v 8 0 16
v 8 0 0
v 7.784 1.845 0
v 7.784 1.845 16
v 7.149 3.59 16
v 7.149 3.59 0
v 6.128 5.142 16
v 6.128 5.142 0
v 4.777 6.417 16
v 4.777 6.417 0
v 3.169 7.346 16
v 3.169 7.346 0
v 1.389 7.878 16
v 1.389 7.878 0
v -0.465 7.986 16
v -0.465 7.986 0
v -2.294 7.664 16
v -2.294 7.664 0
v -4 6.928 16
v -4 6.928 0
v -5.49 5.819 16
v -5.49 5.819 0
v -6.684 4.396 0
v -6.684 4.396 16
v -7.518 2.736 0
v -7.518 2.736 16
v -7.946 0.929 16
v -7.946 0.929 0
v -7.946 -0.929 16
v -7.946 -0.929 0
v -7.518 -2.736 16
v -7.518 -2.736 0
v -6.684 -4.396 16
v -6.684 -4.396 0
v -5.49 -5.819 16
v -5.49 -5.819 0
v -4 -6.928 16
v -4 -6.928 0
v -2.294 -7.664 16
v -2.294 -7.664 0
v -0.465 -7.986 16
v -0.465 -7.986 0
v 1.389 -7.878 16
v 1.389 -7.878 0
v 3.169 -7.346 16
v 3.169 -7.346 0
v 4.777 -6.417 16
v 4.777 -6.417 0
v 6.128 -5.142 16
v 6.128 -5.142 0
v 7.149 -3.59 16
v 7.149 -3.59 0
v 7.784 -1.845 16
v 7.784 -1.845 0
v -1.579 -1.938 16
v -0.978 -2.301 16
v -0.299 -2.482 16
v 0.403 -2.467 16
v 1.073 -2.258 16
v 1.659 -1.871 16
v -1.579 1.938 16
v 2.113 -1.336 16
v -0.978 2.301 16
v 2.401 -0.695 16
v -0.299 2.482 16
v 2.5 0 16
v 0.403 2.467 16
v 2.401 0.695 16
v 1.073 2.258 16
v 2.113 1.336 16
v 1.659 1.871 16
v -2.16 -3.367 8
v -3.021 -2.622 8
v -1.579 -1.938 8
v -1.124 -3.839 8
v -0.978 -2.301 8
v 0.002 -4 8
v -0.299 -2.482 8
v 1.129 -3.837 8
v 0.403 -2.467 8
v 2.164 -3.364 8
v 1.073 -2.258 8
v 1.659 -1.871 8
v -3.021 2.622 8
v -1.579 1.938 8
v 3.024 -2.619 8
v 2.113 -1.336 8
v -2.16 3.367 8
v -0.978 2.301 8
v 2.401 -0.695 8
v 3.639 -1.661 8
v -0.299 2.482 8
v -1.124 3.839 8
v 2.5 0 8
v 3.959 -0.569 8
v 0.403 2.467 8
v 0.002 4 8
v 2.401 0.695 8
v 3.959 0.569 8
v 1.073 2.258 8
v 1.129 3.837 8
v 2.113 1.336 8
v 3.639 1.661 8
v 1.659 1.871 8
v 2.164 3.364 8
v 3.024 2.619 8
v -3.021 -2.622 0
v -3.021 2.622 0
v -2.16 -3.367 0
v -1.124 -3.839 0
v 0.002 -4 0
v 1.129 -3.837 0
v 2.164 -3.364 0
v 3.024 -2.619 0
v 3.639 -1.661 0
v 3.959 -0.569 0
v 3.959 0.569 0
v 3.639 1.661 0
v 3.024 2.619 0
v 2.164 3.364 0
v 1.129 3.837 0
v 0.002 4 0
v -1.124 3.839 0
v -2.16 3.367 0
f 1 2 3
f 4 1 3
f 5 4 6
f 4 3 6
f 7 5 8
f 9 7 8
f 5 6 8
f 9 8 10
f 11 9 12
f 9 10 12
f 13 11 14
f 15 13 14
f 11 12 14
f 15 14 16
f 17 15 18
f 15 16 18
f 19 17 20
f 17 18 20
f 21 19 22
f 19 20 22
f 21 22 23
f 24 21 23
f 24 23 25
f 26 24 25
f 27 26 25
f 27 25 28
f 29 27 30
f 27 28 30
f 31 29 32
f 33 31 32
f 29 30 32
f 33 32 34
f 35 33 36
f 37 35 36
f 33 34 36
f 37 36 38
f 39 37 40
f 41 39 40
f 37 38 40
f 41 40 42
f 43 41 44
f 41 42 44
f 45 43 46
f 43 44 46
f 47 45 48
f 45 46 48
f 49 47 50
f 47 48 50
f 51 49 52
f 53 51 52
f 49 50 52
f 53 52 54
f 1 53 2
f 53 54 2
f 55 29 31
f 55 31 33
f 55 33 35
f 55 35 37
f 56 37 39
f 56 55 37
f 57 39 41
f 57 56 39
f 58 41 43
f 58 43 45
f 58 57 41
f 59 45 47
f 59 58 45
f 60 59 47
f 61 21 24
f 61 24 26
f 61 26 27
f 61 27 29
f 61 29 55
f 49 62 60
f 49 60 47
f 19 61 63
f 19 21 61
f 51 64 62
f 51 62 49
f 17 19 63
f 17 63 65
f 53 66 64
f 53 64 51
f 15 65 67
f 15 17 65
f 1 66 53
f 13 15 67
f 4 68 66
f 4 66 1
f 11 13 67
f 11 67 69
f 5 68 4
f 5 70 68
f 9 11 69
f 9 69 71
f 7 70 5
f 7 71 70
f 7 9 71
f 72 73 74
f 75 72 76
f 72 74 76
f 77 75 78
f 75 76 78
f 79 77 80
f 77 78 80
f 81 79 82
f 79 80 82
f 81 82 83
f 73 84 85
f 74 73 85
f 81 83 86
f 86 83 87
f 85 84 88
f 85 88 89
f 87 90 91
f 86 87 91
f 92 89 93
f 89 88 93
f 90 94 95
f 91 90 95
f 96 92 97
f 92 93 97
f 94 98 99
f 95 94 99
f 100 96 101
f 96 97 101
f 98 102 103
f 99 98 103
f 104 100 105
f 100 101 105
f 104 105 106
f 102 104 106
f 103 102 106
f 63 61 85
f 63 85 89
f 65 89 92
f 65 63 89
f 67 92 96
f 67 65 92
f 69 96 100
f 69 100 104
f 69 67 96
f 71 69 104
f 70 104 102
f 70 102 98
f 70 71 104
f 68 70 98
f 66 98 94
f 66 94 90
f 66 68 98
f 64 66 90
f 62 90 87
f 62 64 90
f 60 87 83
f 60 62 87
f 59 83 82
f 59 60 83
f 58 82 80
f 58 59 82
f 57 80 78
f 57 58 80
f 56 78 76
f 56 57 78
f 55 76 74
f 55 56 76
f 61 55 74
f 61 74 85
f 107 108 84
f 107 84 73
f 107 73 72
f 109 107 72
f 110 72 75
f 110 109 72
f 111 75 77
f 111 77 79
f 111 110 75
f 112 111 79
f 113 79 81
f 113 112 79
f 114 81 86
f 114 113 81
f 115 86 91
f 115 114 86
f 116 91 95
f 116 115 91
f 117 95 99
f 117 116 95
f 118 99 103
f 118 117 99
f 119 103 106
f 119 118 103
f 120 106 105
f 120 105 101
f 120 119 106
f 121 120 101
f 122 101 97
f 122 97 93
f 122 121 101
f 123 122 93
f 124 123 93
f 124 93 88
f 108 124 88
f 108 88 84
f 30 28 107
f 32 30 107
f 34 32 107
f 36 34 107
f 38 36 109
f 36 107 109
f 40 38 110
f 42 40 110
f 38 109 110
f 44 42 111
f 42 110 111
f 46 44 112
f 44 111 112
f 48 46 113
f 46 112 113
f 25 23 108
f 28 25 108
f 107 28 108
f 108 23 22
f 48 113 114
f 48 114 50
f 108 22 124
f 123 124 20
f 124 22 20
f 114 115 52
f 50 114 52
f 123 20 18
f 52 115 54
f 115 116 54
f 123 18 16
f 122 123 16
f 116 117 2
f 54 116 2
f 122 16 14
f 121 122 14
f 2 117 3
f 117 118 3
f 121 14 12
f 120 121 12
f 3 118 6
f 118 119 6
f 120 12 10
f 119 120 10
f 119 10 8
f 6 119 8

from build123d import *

# Parameters (mm, degrees)
SKETCH_1_R          = 8
EXTRUDE_1_DEPTH     = 16
CUT_EXTRUDE_1_DEPTH = 8
CUT_EXTRUDE_2_DEPTH = 8


with BuildPart() as part:
    # 草图1 → 凸台-拉伸1 (new body)
    with BuildSketch(Plane.XY):
        Circle(SKETCH_1_R)
    extrude(amount=EXTRUDE_1_DEPTH)

    # 草图2 → 切除-拉伸1 (cut)
    with BuildSketch(Plane(origin=(0, 0, 0), x_dir=(-1, 0, 0), z_dir=(0, 0, -1))):
        with BuildLine():
            Line((3.020550217, 2.622265506), (3.020550217, -2.622265506))
            ThreePointArc((3.020550217, -2.622265506), (-4, 0), (3.020550217, 2.622265506))
        make_face()
    extrude(amount=-CUT_EXTRUDE_1_DEPTH, mode=Mode.SUBTRACT)

    # 草图3 → 切除-拉伸2 (cut)
    with BuildSketch(Plane.XY.offset(16)):
        with BuildLine():
            Line((-1.578947526, -1.938278801), (-1.578947526, 1.938278801))
            ThreePointArc((-1.578947526, 1.938278801), (2.5, 0), (-1.578947526, -1.938278801))
        make_face()
    extrude(amount=-CUT_EXTRUDE_2_DEPTH, mode=Mode.SUBTRACT)


solid = part.part
